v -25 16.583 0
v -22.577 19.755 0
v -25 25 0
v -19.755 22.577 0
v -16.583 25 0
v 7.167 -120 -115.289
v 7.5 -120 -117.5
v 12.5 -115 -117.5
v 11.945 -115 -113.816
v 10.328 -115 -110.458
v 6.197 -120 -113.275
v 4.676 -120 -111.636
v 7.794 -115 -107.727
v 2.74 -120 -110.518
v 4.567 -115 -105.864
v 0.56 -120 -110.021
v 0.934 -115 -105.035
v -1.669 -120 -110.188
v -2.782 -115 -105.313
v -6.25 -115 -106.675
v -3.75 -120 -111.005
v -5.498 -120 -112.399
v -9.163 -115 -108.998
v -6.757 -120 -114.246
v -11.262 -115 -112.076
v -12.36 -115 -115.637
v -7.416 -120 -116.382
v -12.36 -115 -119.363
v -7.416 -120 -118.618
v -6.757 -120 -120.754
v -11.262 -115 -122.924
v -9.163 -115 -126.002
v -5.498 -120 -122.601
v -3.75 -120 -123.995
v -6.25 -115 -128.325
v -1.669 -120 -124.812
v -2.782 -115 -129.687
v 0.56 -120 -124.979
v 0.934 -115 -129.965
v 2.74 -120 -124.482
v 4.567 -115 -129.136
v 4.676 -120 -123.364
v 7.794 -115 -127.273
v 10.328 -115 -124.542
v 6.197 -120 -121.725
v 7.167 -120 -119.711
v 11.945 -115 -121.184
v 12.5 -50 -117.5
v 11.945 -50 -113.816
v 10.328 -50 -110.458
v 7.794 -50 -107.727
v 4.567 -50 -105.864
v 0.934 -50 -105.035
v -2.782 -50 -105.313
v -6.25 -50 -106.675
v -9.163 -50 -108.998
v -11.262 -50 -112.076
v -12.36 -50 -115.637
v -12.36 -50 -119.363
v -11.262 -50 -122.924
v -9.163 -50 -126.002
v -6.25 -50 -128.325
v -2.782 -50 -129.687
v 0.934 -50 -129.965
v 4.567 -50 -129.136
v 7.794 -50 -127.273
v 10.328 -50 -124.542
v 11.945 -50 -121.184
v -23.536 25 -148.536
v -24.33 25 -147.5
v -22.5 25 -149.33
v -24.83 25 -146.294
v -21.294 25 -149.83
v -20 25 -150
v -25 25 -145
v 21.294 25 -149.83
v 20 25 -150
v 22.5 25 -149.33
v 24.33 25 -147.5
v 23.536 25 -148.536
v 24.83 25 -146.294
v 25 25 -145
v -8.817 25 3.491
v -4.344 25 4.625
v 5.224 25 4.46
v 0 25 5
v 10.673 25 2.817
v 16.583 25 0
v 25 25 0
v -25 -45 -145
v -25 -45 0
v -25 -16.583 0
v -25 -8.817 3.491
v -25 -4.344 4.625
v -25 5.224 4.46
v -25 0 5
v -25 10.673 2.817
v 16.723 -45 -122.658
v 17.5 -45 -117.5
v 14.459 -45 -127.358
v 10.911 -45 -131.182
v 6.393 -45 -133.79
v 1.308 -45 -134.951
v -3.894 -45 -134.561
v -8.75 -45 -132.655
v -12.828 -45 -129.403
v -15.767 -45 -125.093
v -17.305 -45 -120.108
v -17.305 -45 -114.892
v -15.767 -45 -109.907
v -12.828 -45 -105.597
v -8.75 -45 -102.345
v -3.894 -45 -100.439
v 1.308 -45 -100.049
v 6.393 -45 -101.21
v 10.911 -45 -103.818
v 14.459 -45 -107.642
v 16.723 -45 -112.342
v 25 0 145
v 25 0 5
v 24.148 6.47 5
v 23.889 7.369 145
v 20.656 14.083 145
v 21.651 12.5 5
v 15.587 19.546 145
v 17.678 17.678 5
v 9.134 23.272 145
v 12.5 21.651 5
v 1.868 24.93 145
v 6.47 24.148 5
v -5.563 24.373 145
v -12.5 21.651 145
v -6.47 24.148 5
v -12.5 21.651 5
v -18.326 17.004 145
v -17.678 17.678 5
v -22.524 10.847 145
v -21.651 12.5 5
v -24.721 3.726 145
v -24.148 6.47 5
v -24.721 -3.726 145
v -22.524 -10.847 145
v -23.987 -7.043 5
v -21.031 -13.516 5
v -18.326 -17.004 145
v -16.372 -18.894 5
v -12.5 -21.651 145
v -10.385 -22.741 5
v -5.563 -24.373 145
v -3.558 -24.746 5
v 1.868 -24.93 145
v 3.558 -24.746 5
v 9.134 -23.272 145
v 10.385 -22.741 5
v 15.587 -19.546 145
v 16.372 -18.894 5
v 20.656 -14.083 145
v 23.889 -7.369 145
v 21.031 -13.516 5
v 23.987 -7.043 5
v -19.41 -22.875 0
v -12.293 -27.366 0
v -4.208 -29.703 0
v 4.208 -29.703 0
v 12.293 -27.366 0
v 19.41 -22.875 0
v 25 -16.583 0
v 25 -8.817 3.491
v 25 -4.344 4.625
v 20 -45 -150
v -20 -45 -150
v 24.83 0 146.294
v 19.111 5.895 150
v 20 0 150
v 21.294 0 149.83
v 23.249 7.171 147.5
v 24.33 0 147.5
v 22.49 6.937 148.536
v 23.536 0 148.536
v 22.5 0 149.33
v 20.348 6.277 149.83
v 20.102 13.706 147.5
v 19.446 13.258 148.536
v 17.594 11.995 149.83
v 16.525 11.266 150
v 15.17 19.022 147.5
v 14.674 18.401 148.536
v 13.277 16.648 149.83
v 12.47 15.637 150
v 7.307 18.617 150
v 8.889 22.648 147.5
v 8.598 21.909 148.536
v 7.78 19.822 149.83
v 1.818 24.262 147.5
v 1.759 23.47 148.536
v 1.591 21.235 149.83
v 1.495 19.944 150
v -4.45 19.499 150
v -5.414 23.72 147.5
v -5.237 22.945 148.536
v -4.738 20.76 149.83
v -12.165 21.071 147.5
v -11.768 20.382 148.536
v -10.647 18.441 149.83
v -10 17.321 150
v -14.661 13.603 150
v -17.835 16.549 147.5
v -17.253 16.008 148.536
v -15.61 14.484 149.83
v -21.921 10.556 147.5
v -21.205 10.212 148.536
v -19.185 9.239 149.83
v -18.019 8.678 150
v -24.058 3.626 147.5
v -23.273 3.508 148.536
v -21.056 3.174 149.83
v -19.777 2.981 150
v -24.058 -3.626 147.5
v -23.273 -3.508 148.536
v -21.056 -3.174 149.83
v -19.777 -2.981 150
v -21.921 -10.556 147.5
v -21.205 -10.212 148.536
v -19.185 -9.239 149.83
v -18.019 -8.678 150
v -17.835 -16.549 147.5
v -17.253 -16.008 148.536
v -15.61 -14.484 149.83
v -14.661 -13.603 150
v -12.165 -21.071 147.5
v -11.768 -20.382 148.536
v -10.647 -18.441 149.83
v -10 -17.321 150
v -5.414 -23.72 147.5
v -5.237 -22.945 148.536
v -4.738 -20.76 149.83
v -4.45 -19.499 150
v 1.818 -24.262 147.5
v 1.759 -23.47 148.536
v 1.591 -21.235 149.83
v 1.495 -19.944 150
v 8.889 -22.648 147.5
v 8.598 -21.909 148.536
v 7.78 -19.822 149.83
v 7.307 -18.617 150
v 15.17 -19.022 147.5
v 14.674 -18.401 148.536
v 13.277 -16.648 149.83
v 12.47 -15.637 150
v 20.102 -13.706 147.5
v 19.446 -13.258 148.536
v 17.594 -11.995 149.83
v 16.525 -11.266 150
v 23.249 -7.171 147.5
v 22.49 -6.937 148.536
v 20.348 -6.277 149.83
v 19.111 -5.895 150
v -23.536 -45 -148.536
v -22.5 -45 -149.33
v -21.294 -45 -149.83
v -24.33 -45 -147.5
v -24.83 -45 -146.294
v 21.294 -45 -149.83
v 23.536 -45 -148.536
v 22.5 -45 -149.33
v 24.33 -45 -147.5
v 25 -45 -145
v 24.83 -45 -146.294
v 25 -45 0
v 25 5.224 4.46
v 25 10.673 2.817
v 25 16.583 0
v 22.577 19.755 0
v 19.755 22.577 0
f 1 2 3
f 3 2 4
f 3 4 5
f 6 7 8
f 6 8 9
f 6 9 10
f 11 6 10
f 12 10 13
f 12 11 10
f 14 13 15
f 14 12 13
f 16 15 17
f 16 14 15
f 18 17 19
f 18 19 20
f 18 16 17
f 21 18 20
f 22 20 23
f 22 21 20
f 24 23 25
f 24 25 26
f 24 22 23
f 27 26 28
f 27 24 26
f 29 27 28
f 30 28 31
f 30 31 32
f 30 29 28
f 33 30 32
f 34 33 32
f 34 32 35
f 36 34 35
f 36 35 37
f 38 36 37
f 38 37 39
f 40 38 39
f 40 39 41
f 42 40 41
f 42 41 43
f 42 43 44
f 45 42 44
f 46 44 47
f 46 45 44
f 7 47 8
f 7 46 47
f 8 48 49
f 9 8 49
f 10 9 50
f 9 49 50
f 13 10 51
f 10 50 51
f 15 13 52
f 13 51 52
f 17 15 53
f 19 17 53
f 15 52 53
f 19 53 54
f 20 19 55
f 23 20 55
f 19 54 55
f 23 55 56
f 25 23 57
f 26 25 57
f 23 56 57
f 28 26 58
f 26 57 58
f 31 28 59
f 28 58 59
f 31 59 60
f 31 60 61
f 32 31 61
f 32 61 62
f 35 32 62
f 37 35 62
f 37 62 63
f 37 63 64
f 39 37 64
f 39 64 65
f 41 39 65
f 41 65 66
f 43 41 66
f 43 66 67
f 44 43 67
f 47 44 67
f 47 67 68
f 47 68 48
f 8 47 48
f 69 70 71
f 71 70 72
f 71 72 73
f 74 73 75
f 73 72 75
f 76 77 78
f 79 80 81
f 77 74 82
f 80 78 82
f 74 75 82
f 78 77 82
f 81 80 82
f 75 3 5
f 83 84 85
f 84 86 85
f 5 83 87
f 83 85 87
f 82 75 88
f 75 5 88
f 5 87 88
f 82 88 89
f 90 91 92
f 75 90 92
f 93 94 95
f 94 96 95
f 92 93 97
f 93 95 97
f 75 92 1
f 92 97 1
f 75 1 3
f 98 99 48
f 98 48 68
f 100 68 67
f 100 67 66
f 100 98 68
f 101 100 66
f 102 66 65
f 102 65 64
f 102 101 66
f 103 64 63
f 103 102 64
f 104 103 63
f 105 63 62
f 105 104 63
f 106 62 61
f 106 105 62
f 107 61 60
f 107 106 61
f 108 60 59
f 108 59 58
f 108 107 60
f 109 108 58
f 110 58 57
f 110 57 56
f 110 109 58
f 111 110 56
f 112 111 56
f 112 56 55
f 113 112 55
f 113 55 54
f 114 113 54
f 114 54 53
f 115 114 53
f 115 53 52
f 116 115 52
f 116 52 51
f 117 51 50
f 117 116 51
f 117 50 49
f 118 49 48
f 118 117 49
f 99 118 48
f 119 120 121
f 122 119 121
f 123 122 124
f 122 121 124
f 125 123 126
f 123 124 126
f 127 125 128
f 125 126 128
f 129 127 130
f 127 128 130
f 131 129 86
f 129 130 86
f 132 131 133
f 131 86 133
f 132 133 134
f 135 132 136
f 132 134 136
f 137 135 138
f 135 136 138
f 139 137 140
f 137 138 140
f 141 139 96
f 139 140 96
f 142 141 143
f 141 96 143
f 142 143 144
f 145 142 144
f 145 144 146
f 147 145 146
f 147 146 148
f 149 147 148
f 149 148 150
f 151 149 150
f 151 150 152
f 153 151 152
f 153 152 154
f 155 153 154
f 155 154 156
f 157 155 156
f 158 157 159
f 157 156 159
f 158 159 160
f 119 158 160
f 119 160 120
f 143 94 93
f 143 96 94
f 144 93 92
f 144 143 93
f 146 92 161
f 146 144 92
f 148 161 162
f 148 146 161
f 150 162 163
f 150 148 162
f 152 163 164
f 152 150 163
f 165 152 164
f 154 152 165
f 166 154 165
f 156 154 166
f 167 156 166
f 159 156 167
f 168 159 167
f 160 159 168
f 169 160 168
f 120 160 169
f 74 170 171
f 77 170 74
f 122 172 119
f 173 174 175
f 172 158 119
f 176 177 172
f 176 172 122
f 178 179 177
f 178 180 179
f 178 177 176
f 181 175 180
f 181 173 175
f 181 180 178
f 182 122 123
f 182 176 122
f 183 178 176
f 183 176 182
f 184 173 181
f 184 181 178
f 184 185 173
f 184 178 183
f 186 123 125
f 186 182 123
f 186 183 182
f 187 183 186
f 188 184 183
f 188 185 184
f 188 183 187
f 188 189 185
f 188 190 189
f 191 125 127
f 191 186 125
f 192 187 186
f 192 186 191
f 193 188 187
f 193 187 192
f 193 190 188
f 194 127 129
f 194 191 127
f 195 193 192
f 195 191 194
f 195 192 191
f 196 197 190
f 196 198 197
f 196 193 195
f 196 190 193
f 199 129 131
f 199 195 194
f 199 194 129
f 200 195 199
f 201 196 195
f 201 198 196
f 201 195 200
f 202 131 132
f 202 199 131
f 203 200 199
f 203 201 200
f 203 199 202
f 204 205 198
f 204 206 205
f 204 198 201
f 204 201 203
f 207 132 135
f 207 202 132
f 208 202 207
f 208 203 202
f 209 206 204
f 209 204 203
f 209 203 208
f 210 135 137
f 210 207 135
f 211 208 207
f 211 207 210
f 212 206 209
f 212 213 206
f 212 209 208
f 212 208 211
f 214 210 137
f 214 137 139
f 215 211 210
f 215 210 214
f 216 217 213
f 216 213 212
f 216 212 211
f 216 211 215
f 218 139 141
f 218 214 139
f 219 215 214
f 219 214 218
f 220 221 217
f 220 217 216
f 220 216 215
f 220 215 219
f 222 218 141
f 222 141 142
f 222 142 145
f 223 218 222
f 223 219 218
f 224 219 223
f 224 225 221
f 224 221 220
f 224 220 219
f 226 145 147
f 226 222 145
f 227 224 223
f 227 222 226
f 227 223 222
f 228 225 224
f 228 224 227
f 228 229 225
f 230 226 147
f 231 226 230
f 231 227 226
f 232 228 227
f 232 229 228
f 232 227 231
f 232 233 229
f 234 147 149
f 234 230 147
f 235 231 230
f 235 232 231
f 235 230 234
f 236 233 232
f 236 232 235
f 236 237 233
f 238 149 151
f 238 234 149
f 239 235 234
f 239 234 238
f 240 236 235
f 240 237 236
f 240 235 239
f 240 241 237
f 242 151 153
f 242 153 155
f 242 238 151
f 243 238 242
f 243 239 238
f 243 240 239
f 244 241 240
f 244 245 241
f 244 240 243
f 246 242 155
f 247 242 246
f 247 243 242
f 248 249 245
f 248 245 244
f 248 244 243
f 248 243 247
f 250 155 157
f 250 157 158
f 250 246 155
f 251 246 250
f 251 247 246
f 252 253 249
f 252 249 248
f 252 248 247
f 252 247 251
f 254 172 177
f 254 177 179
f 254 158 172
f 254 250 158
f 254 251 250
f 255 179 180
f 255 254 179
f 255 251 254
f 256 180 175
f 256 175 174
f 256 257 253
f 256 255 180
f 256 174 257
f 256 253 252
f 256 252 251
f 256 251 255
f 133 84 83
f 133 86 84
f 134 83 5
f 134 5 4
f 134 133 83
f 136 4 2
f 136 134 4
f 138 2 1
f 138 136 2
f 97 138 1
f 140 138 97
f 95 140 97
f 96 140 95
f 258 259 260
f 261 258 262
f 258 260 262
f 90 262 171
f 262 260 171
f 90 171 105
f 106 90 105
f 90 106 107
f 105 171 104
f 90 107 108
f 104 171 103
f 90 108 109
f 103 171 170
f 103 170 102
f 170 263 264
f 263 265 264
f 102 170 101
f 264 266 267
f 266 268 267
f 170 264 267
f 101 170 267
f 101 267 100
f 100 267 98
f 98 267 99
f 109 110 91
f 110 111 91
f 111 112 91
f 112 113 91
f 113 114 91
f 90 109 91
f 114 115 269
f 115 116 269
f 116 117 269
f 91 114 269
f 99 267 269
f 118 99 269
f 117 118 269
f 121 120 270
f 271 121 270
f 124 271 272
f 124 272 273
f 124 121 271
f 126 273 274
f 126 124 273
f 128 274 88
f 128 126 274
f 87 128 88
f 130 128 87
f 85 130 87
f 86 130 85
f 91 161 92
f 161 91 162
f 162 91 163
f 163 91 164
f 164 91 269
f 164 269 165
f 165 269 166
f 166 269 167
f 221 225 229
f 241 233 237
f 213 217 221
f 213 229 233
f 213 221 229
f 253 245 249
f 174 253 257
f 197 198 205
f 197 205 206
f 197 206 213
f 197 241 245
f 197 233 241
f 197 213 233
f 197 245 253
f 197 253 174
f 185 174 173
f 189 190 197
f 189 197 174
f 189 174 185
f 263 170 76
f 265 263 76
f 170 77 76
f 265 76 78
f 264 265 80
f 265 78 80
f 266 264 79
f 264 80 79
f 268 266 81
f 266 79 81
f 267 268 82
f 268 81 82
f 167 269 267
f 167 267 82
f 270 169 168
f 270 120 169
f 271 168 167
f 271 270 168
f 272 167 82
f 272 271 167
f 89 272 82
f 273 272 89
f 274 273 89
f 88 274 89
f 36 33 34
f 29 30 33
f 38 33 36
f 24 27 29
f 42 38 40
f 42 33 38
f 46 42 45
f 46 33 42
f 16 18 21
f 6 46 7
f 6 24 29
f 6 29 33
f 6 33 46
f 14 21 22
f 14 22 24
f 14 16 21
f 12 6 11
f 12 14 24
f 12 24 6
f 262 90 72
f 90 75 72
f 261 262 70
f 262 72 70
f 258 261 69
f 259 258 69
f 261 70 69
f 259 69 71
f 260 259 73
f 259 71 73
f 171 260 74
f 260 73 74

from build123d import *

# Parameters (mm, degrees)
F1_W         = 70
F1_H         = 150
F2_DEPTH     = 25
F0_R         = 25
F3_DEPTH     = 150
F4_R         = 5
F5_R         = 5
F6_R         = 5
F7_T4_ANGLE  = 180
F7_T10_ANGLE = 90
F7_T16_ANGLE = 90
F8_R         = 12.5
F9_DEPTH     = 120
F10_SIZE     = 5


# Not quite as in the source:
# - a fillet or chamfer that OpenCascade refuses, or shapes differently, is made with other operations: its cross-section is extruded or revolved along the edge and cut away or added


with BuildPart() as f2:
    # F1 (on Right) → F2 (new body, symmetric)
    with BuildSketch(Plane.YZ):
        with Locations((-10, -75)):
            Rectangle(F1_W, F1_H)
    extrude(amount=F2_DEPTH, both=True)

    # F0 (on Top) → F3 (join)
    with BuildSketch(Plane.XY):
        Circle(F0_R)
    extrude(amount=F3_DEPTH)

    # F4
    f4_edges = [f2.edges().sort_by_distance(p)[0] for p in [
        (-25, 0, 150),
    ]]
    fillet(f4_edges, radius=F4_R)

    # F5
    f5_edges = [f2.edges().sort_by_distance(p)[0] for p in [
        (-25, -10, -150),
    ]]
    fillet(f5_edges, radius=F5_R)

    # F6
    f6_edges = [f2.edges().sort_by_distance(p)[0] for p in [
        (25, -10, -150),
    ]]
    fillet(f6_edges, radius=F6_R)

    # F7: chamfer of 5 on 3 edges, made by hand


with BuildPart() as f7_tool2:
    # F7_s3 → F7_t4 (revolve)
    with BuildSketch(Plane.XZ):
        Polygon((-30, 0), (-25, 5), (-25, 0), align=None)
    revolve(axis=Axis((0, 0, 0), (0, 0, 1)), revolution_arc=F7_T4_ANGLE)

    split(bisect_by=Plane.YZ.offset(25), keep=Keep.BOTTOM)

    split(bisect_by=Plane.YZ.offset(-25), keep=Keep.TOP)


with BuildPart() as f2_1:
    add(f2.part)

    # F7_t1: union F7_tool2
    add(f7_tool2.part)


with BuildPart() as f7_tool8:
    # F7_s9 → F7_t10 (revolve)
    with BuildSketch(Plane.XZ):
        Polygon((30, 0), (25, 5), (25, 0), align=None)
    revolve(axis=Axis((0, 0, 0), (0, 0, 1)), revolution_arc=F7_T10_ANGLE)

    split(bisect_by=Plane.YZ.offset(25), keep=Keep.BOTTOM)

    split(bisect_by=Plane.XZ.offset(-25), keep=Keep.TOP)


with BuildPart() as f2_2:
    add(f2_1.part)

    # F7_t7: union F7_tool8
    add(f7_tool8.part)


with BuildPart() as f7_tool14:
    # F7_s15 → F7_t16 (revolve)
    with BuildSketch(Plane.YZ):
        Polygon((30, 0), (25, 5), (25, 0), align=None)
    revolve(axis=Axis((0, 0, 0), (0, 0, 1)), revolution_arc=F7_T16_ANGLE)

    split(bisect_by=Plane.YZ.offset(-25), keep=Keep.TOP)

    split(bisect_by=Plane.XZ.offset(-25), keep=Keep.TOP)


with BuildPart() as f2_3:
    add(f2_2.part)

    # F7_t13: union F7_tool14
    add(f7_tool14.part)

    # F8 (on Front) → F9 (join)
    with BuildSketch(Plane.XZ):
        with Locations((0, -117.5)):
            Circle(F8_R)
    extrude(amount=F9_DEPTH)

    # F10
    f10_edges = [f2_3.edges().sort_by_distance(p)[0] for p in [
        (-12.5, -120, -117.5),
        (-12.5, -45, -117.5),
    ]]
    chamfer(f10_edges, length=F10_SIZE)


solid = f2_3.part
